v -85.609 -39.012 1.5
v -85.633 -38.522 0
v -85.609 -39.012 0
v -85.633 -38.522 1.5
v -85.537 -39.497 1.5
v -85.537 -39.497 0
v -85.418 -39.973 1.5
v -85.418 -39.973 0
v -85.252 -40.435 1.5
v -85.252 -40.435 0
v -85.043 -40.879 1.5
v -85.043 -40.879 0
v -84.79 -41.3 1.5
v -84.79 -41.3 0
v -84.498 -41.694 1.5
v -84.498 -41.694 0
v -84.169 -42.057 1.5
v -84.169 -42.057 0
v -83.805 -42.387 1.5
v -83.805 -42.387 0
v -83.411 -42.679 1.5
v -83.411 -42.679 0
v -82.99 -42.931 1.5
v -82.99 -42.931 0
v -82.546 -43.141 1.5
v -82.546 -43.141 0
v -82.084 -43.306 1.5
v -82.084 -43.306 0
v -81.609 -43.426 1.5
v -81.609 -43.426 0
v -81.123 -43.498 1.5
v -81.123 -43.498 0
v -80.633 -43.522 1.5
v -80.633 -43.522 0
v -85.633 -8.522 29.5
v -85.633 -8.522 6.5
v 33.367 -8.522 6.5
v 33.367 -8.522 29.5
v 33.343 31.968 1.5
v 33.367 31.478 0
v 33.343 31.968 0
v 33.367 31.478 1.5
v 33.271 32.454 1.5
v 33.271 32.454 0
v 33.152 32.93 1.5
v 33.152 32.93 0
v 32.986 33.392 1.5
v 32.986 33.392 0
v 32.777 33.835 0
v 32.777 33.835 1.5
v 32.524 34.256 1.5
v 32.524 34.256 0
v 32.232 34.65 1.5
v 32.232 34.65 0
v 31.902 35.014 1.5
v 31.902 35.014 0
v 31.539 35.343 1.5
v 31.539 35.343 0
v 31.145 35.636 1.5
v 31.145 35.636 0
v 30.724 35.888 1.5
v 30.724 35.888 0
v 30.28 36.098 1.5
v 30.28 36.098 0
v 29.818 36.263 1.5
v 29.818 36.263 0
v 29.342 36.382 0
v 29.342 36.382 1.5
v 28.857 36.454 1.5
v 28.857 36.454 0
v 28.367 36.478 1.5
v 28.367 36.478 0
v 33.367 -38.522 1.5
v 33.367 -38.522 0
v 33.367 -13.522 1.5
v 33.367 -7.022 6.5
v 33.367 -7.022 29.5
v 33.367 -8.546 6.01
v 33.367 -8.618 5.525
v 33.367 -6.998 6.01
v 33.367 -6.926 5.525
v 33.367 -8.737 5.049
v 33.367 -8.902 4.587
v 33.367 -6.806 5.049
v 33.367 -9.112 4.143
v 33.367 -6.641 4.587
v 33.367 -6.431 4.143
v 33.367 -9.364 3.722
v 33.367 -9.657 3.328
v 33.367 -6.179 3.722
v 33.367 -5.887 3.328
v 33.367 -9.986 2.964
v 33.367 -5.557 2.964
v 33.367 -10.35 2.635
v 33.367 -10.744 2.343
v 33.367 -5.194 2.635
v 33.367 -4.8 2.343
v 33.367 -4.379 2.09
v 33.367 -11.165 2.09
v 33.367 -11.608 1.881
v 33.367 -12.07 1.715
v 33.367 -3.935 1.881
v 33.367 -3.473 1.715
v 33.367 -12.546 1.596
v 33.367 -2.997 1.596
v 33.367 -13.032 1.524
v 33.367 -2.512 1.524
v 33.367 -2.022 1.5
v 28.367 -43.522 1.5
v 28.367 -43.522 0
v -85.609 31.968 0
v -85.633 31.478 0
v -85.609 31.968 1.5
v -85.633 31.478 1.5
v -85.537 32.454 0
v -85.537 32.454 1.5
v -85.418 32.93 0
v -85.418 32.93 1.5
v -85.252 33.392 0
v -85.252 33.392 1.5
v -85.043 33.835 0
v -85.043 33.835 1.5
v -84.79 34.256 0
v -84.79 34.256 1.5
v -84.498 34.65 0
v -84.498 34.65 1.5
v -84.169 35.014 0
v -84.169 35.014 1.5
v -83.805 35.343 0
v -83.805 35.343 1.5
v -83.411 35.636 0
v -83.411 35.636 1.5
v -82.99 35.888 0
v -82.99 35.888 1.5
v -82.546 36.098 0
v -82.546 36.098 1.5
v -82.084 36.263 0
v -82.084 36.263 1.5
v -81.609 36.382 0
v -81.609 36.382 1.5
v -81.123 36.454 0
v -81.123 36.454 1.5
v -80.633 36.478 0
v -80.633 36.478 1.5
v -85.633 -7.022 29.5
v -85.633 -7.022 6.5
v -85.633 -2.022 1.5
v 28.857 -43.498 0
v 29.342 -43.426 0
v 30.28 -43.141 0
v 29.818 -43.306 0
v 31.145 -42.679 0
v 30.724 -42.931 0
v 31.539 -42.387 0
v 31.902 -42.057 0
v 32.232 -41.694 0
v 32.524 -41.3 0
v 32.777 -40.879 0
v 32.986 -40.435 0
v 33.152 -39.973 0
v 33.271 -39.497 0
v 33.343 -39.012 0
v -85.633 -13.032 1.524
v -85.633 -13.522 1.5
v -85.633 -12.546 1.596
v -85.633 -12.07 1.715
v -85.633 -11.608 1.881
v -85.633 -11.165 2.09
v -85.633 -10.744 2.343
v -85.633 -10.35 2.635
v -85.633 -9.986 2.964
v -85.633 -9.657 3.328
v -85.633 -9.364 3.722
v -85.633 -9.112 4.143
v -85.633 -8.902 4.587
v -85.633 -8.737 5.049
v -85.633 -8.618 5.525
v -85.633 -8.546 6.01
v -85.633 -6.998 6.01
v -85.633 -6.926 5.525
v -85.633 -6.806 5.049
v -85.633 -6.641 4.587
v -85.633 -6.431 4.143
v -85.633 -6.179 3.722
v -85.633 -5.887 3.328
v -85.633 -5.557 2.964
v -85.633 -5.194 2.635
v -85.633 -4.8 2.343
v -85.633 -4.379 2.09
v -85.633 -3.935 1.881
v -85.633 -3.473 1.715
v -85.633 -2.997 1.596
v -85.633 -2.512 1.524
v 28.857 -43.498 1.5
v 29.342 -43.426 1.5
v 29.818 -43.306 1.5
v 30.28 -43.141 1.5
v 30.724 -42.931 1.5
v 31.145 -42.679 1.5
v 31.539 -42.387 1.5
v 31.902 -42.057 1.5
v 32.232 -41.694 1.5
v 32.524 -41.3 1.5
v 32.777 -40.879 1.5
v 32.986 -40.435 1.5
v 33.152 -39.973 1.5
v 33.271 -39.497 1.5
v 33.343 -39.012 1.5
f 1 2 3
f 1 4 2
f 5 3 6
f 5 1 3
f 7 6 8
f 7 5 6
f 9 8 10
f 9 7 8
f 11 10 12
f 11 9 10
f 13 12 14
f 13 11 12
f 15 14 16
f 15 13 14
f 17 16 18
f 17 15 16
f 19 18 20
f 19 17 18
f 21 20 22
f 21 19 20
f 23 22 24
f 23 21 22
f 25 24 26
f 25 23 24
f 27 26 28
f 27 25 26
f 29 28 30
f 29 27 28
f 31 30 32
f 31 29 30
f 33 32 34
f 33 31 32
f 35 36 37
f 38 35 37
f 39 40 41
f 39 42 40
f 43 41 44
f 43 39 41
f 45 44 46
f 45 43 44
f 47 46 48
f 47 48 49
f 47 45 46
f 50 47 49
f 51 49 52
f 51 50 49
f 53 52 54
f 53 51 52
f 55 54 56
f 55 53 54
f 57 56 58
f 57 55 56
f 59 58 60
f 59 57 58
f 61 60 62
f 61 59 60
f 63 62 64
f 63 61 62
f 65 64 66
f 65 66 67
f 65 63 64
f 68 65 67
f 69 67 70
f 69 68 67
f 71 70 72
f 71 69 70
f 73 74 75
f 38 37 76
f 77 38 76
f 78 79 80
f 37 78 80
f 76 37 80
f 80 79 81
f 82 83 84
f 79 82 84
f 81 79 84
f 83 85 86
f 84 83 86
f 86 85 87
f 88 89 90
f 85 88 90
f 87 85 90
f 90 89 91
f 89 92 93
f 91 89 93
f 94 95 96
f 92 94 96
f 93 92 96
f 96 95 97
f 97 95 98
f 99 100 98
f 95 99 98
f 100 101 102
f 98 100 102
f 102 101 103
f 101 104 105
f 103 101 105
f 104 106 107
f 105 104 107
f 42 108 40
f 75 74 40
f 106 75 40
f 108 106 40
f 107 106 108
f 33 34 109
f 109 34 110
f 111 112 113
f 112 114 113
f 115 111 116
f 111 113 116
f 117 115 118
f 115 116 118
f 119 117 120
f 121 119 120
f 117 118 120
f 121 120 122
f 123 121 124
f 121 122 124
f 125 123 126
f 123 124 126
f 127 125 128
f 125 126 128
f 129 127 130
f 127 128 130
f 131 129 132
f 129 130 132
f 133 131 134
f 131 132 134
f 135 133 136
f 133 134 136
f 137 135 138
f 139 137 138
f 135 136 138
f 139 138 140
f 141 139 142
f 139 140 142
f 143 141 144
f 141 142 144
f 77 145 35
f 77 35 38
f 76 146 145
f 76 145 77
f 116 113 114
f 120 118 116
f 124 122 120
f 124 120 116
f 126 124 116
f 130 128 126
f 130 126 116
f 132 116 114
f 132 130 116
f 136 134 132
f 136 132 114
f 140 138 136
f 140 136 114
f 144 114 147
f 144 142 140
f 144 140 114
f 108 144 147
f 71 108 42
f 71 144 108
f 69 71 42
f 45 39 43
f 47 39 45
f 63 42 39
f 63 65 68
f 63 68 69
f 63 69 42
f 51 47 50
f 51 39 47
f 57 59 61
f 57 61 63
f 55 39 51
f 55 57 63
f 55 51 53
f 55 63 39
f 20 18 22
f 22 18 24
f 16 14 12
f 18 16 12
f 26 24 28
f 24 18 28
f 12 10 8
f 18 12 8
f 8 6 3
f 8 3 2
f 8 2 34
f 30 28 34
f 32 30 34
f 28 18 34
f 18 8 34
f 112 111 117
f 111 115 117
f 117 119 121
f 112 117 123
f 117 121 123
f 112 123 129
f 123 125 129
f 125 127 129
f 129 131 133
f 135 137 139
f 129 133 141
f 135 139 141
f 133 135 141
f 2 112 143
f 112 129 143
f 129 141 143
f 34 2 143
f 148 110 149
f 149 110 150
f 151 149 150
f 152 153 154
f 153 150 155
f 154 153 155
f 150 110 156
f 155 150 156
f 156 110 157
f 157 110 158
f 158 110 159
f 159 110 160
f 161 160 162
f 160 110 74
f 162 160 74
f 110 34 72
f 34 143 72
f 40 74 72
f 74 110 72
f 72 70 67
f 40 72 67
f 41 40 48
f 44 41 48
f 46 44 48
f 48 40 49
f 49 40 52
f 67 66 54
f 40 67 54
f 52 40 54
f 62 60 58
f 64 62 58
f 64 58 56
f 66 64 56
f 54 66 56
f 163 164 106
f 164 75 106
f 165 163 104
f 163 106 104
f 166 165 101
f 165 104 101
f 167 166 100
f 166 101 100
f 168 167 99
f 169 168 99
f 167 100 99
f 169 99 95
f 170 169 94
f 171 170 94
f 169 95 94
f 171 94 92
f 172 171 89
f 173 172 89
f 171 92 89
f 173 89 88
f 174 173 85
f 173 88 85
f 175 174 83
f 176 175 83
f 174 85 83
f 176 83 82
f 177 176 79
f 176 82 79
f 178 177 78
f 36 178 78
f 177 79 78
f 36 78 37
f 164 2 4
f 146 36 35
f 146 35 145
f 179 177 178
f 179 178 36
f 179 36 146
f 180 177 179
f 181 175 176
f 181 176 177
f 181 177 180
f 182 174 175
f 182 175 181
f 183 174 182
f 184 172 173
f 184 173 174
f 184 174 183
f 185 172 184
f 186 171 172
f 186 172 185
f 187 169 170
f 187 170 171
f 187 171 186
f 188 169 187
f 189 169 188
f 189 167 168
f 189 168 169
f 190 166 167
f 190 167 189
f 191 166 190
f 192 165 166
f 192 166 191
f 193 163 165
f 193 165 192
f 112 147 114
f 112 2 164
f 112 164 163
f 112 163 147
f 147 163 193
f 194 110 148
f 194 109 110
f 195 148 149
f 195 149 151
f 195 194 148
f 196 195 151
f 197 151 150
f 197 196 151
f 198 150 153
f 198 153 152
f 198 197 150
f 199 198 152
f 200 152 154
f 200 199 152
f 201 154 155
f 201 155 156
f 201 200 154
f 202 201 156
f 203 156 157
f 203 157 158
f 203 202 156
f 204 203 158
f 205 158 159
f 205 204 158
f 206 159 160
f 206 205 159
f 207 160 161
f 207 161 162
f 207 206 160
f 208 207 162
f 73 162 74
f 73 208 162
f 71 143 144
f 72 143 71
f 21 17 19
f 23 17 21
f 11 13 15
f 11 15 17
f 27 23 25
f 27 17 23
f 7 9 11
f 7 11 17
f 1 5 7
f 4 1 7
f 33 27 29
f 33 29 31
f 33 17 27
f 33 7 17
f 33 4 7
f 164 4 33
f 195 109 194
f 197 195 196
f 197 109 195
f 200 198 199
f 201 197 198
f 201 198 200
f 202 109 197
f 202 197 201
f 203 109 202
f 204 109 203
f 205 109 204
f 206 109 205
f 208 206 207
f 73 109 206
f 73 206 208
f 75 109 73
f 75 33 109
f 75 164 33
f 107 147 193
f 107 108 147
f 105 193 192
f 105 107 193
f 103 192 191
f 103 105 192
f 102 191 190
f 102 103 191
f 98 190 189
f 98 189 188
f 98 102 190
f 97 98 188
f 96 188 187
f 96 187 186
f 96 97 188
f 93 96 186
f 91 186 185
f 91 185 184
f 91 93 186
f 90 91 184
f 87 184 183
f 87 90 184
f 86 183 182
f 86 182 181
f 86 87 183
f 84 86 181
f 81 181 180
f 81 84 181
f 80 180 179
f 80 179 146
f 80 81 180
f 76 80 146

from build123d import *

# Parameters (mm, degrees)
F0_W     = 119
F0_H     = 80
F1_DEPTH = 1.5
F2_R     = 5
F3_W     = 119
F3_H     = 1.5
F4_DEPTH = 28
F5_R     = 5


with BuildPart() as f1:
    # F0 (on Top) → F1 (new body)
    with BuildSketch(Plane.XY):
        with Locations((-26.13307, -3.521777)):
            Rectangle(F0_W, F0_H)
    extrude(amount=F1_DEPTH)

    # F2
    f2_edges = [f1.edges().sort_by_distance(p)[0] for p in [
        (33.36693, -43.521777, 0.75),
        (33.36693, 36.478223, 0.75),
        (-85.63307, 36.478223, 0.75),
        (-85.63307, -43.521777, 0.75),
    ]]
    fillet(f2_edges, radius=F2_R)

    # F3 (on face) → F4 (join)
    with BuildSketch(Plane.XY.offset(1.5)):
        with Locations((-26.13307, -7.771777)):
            Rectangle(F3_W, F3_H)
    extrude(amount=F4_DEPTH)

    # F5
    f5_edges = [f1.edges().sort_by_distance(p)[0] for p in [
        (-26.13307, -7.021777, 1.5),
        (-26.13307, -8.521777, 1.5),
    ]]
    fillet(f5_edges, radius=F5_R)


solid = f1.part
